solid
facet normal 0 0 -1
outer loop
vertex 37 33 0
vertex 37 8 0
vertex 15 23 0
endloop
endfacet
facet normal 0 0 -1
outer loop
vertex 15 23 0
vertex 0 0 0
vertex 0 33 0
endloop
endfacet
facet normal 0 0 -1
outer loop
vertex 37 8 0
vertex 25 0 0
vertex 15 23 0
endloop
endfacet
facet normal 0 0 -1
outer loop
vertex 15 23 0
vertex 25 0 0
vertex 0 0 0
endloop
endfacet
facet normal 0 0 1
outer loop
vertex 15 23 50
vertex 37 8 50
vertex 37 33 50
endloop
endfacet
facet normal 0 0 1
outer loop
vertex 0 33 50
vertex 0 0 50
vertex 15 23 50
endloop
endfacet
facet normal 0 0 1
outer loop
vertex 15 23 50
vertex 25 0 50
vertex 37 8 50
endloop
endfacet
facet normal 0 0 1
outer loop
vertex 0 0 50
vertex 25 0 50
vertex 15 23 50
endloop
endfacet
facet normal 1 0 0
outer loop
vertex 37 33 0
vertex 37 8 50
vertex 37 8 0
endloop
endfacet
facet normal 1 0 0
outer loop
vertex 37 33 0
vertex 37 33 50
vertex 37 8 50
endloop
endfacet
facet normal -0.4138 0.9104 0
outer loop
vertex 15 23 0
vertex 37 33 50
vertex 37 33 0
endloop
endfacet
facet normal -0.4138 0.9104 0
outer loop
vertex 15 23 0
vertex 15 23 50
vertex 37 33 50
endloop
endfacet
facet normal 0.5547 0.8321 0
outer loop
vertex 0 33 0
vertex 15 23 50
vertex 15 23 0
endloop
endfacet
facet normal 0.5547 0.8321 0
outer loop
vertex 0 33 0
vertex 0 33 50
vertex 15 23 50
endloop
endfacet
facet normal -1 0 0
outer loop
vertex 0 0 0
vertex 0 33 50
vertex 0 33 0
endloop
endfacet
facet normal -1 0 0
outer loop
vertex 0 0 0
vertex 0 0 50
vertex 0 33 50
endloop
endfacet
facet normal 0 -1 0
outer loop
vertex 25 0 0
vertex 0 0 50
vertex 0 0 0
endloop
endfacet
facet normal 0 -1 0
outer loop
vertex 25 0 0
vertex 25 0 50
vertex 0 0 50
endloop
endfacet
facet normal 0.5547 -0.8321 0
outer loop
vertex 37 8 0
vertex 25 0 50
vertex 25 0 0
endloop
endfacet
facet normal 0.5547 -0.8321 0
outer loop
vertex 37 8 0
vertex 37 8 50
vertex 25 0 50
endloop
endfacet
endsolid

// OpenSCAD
// Given dimensions
d1 = 25;
d2 = 12;
d3 = 15;
h1 = 23;
h2 = 10;
h3 = 8;

// Points
p0 = [0,0];
p1 = [0,h1+h2];
p2 = [d3,h1];
p3 = [d1+d2,h1+h2];
p4 = [d1+d2,h3];
p5 = [d1,0];

points = [p0, p1, p2, p3, p4, p5];

echo(points);

linear_extrude(height=50)
    polygon(points);
